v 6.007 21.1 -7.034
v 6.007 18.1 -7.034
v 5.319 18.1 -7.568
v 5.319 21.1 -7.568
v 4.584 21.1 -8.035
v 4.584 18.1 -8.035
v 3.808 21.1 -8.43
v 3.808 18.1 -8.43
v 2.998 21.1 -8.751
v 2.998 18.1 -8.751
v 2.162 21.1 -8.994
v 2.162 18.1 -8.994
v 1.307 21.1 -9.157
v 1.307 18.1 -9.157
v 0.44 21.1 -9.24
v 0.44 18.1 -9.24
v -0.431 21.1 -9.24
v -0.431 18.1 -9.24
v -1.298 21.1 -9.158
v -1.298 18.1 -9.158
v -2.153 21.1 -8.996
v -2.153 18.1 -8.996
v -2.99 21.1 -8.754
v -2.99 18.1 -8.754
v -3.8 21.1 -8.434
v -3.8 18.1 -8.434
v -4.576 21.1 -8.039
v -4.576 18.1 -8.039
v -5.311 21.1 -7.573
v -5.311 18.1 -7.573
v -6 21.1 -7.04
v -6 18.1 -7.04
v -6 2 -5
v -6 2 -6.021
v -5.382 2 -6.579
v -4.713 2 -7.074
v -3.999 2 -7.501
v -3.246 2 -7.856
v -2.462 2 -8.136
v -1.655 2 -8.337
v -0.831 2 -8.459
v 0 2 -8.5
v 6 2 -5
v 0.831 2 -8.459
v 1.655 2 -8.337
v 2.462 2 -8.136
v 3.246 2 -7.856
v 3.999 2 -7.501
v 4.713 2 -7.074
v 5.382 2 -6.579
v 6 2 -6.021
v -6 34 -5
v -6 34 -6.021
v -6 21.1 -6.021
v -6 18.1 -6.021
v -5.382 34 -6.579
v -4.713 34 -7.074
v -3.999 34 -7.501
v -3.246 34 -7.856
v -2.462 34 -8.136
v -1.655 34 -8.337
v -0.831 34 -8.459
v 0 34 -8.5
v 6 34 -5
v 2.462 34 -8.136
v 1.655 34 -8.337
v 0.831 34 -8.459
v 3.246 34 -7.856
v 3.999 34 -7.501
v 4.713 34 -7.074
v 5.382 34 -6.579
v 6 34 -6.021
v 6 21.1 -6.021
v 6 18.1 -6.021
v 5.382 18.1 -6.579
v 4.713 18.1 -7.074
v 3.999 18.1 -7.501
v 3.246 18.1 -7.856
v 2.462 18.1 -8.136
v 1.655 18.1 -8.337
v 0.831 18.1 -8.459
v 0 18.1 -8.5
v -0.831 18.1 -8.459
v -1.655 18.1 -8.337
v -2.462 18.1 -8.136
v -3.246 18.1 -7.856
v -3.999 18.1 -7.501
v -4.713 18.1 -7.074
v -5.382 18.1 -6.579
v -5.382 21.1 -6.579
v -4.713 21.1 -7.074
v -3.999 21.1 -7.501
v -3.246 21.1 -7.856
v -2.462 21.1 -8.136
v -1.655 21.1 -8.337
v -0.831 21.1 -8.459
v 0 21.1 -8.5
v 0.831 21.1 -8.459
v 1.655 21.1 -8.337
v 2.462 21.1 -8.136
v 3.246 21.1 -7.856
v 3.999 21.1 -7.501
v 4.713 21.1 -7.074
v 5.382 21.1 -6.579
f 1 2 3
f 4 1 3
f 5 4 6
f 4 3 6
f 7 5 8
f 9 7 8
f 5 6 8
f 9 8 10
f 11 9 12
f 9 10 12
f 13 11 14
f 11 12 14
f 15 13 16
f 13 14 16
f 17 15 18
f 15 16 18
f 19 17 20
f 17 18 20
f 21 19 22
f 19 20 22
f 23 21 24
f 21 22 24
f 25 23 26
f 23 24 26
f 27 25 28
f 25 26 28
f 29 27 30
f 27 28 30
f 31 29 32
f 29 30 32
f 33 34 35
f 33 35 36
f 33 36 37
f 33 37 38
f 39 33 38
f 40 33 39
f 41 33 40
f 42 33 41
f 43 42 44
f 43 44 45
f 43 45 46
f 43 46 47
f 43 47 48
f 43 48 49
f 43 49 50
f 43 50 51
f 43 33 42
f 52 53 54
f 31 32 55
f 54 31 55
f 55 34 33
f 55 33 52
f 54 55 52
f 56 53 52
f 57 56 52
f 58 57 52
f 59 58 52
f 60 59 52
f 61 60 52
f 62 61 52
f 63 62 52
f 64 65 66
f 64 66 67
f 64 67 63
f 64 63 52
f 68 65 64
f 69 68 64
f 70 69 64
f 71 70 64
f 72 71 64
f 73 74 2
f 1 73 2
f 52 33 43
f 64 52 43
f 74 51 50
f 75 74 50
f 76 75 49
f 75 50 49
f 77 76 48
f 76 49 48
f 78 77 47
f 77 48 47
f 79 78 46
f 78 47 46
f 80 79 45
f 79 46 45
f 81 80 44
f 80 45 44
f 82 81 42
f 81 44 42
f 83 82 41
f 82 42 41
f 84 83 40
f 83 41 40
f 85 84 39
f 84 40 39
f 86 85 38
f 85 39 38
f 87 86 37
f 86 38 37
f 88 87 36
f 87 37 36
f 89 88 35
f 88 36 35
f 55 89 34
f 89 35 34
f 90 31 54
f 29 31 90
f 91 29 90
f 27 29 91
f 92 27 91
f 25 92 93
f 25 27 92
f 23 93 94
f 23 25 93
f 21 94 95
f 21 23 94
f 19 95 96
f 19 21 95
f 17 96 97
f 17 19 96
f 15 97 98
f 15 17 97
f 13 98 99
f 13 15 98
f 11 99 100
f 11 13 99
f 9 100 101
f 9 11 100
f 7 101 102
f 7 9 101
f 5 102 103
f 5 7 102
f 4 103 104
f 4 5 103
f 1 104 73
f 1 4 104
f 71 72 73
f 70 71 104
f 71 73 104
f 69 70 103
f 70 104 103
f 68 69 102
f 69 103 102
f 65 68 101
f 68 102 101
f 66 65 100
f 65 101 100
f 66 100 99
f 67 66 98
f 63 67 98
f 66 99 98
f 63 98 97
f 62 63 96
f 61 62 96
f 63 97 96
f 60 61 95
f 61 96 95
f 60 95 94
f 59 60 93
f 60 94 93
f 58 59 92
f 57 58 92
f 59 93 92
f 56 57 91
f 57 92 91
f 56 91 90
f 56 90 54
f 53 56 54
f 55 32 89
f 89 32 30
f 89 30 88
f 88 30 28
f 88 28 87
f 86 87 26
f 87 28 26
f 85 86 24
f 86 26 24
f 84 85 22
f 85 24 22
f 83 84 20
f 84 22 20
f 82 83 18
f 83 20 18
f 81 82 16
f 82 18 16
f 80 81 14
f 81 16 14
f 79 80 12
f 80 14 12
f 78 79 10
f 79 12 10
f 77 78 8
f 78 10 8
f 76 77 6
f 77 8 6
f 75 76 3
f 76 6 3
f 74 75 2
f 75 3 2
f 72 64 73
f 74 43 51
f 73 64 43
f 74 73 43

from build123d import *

# Parameters (mm, degrees)
BOSS_EXTRUDE1_DEPTH = 29
BOSS_EXTRUDE3_START = -3
BOSS_EXTRUDE3_DEPTH = 3
BOSS_EXTRUDE4_DEPTH = 29
SKETCH6_W           = 15.595785808
SKETCH6_H           = 9.872798586
CUT_EXTRUDE1_DEPTH  = 2
BOSS_EXTRUDE5_DEPTH = 5


with BuildPart() as part:
    # Sketch2 → Boss-Extrude1 (new body)
    with BuildSketch(Plane(origin=(0, 0, 0), x_dir=(1, 0, 0), z_dir=(0, 1, 0))):
        with BuildLine():
            Line((-6, 6.020797289), (-6, 5))
            Line((-6, 5), (-5.921359641, 5))
            ThreePointArc((-5.921359641, 5), (0, 7.75), (5.921359641, 5))
            Line((5.921359641, 5), (6, 5))
            Line((6, 5), (6, 6.020797289))
            ThreePointArc((6, 6.020797289), (0, 8.5), (-6, 6.020797289))
        make_face()
    extrude(amount=BOSS_EXTRUDE1_DEPTH)

    # Sketch4 → Boss-Extrude3 (add)
    with BuildSketch(Plane(origin=(0, 21.1, 0), x_dir=(1, 0, 0), z_dir=(0, 1, 0)).offset(BOSS_EXTRUDE3_START)):
        with BuildLine():
            Line((6, 6.020797289), (6.006787511, 7.03427351))
            ThreePointArc((6.006787511, 7.03427351), (0.004460918, 9.249998925), (-6, 7.040063921))
            Line((-6, 7.040063921), (-6, 6.020797289))
            ThreePointArc((-6, 6.020797289), (0, 8.5), (6, 6.020797289))
        make_face()
    extrude(amount=BOSS_EXTRUDE3_DEPTH)

    # Sketch5 → Boss-Extrude4 (add)
    with BuildSketch(Plane.XZ):
        with BuildLine():
            Line((-5.921359641, -5), (5.921359641, -5))
            ThreePointArc((5.921359641, -5), (0, -7.75), (-5.921359641, -5))
        make_face()
    extrude(amount=-BOSS_EXTRUDE4_DEPTH)

    # Sketch6 → Cut-Extrude1 (cut)
    with BuildSketch(Plane.XZ):
        with Locations((-0.763992961, -6.245386966)):
            Rectangle(SKETCH6_W, SKETCH6_H)
    extrude(amount=-CUT_EXTRUDE1_DEPTH, mode=Mode.SUBTRACT)

    # Sketch7 → Boss-Extrude5 (add)
    with BuildSketch(Plane(origin=(0, 29, 0), x_dir=(1, 0, 0), z_dir=(0, 1, 0))):
        with BuildLine():
            Line((-6, 5), (6, 5))
            Line((6, 5), (6, 6.020797289))
            ThreePointArc((6, 6.020797289), (0, 8.5), (-6, 6.020797289))
            Line((-6, 6.020797289), (-6, 5))
        make_face()
    extrude(amount=BOSS_EXTRUDE5_DEPTH)


solid = part.part
